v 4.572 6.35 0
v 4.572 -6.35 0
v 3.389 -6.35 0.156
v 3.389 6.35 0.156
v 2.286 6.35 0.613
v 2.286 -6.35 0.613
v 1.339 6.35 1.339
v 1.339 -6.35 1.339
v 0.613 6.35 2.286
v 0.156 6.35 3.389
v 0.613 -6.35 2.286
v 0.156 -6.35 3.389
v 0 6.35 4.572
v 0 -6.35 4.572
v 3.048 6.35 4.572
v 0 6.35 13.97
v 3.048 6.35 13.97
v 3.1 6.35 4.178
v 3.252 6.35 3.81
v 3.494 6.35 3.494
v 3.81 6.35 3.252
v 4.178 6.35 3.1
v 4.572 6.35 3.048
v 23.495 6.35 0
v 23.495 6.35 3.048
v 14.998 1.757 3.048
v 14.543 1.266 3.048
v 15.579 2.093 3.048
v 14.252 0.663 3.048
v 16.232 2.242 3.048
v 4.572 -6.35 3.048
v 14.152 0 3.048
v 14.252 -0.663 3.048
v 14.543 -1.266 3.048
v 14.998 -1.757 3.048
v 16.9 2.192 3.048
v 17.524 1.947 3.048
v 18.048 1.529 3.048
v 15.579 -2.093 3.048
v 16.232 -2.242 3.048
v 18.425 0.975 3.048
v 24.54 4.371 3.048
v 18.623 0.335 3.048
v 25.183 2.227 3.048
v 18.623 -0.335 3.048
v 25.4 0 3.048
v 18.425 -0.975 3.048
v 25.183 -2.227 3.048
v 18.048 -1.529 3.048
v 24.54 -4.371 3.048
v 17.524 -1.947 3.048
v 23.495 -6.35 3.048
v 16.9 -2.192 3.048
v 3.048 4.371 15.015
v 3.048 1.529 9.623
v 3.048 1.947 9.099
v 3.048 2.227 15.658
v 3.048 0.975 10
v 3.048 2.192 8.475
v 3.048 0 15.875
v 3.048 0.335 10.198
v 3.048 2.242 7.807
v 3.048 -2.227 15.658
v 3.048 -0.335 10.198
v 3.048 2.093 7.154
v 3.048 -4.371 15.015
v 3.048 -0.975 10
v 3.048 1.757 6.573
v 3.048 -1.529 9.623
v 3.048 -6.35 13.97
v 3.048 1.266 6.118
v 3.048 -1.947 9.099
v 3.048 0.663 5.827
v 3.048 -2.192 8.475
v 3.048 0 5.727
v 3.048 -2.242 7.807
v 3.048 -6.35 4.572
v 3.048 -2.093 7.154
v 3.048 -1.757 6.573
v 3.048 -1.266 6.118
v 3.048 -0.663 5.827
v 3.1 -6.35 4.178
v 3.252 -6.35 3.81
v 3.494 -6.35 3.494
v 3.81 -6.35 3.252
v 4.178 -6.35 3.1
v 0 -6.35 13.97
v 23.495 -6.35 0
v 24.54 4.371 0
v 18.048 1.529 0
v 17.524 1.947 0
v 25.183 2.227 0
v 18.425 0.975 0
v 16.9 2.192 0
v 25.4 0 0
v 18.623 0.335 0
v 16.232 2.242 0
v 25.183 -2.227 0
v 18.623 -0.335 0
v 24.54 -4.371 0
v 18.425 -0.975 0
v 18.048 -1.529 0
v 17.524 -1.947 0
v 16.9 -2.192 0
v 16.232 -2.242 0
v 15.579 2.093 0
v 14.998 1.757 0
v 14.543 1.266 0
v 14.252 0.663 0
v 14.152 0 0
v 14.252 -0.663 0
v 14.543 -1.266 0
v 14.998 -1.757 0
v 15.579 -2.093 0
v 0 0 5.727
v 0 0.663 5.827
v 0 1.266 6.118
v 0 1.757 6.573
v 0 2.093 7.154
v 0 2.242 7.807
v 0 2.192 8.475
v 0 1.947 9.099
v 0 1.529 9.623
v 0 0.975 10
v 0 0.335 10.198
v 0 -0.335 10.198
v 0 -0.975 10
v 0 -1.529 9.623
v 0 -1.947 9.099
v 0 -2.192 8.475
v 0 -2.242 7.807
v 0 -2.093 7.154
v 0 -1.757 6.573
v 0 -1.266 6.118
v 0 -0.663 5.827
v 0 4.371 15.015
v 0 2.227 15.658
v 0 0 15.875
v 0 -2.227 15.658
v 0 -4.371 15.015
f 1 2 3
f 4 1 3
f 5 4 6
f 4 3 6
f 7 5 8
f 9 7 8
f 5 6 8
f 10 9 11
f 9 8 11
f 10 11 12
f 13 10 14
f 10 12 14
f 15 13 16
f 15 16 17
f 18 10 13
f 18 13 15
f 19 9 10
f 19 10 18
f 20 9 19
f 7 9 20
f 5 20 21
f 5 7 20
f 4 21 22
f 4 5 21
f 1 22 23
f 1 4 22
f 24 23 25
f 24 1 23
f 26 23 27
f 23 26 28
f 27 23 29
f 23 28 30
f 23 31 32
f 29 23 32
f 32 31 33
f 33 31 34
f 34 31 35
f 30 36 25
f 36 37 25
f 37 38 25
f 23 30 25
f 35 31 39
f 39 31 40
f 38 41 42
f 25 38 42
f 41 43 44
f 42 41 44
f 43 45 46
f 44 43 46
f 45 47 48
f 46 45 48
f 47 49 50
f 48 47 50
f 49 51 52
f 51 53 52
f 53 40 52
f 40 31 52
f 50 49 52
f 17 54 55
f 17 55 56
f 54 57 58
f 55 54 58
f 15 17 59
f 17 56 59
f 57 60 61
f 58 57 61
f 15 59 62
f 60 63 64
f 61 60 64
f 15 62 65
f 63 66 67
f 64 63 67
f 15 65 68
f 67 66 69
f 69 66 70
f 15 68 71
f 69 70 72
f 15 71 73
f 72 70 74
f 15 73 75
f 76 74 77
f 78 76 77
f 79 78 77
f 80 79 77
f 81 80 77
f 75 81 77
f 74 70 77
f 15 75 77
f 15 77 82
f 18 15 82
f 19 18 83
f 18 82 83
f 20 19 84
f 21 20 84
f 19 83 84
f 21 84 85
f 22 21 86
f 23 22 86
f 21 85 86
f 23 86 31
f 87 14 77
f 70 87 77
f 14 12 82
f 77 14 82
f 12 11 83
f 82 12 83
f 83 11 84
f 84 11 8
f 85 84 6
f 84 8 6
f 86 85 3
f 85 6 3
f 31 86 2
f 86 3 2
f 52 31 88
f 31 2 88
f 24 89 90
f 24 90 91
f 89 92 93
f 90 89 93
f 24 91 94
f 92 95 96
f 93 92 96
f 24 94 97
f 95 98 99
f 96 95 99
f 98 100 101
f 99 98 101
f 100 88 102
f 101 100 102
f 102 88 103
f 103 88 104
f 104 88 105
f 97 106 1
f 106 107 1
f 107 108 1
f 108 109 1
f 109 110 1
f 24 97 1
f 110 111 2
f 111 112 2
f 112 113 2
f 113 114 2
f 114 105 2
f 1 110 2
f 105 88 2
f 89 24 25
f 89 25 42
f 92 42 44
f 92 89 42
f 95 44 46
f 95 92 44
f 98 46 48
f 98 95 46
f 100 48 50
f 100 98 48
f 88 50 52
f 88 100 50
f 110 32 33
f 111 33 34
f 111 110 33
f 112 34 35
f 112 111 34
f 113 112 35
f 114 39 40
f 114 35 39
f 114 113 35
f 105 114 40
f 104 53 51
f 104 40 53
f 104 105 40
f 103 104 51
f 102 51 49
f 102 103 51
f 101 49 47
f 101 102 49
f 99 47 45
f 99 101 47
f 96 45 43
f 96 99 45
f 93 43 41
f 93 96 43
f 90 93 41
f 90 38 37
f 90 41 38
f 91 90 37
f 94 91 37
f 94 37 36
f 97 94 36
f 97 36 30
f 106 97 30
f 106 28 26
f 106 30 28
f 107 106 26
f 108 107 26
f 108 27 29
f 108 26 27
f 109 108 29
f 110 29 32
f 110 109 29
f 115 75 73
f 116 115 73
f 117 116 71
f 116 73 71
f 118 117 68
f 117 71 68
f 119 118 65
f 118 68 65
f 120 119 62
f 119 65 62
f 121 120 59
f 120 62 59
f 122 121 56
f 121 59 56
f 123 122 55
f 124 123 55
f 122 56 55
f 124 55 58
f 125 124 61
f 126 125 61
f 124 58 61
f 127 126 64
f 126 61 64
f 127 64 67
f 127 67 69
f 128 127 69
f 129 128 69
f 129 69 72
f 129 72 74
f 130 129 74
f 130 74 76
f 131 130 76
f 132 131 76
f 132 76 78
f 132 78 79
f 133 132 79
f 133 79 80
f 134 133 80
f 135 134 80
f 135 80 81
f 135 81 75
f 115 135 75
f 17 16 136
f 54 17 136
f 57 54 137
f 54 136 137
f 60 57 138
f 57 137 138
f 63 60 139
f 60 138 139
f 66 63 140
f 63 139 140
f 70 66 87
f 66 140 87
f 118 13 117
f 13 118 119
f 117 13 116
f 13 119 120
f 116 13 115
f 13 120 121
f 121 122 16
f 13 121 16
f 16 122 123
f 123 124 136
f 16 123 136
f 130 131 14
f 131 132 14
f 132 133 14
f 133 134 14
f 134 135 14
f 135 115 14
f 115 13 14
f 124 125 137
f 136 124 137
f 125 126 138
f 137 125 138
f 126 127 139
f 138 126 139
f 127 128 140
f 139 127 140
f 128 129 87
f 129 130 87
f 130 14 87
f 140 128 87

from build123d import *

# Parameters (mm, degrees)
EXTRUDE_THIN1_START     = -6.35
EXTRUDE_THIN1_DEPTH     = 12.7
SKETCH4_R               = 2.2479
EXTRUDE3_DEPTH          = 29.141606724
SKETCH6_R               = 2.2479
CUT_EXTRUDE1_DEPTH      = 31.618591166
CUT_EXTRUDE2_DEPTH      = 29.141606724
CUT_EXTRUDE2_DEPTH_BACK = 29.141606724
CUT_EXTRUDE3_DEPTH      = 31.618591166
CUT_EXTRUDE3_DEPTH_BACK = 31.618591166


# Read off the part's stored shape, not the designer's step: Extrude-Thin1
with BuildPart() as part:
    # Extrude-Thin1 outline → Extrude-Thin1 (new body)
    with BuildSketch(Plane(origin=(0, 0, 0), x_dir=(1, 0, 0), z_dir=(0, 1, 0)).offset(EXTRUDE_THIN1_START)):
        with BuildLine():
            Line((4.572, -3.048), (25.4, -3.048))
            Line((25.4, -3.048), (25.4, 0))
            Line((25.4, 0), (4.572, 0))
            ThreePointArc((4.572, 0), (1.339107796, -1.339107796), (0, -4.572))
            Line((0, -4.572), (0, -15.875))
            Line((0, -15.875), (3.048, -15.875))
            Line((3.048, -15.875), (3.048, -4.572))
            ThreePointArc((3.048, -4.572), (3.494369265, -3.494369265), (4.572, -3.048))
        make_face()
    extrude(amount=EXTRUDE_THIN1_DEPTH)

    # Sketch4 → Extrude3 (cut, through all)
    with BuildSketch(Plane(origin=(3.048, 0, 0), x_dir=(0, 0, -1), z_dir=(1, 0, 0))):
        with Locations((-7.975, 0)):
            Circle(SKETCH4_R)
    extrude(amount=-EXTRUDE3_DEPTH, mode=Mode.SUBTRACT)

    # Sketch6 → Cut-Extrude1 (cut, through all)
    with BuildSketch(Plane.XY):
        with Locations(Location((16.4, 0, 0), (0, 0, 180))):
            Circle(SKETCH6_R)
    extrude(amount=CUT_EXTRUDE1_DEPTH, mode=Mode.SUBTRACT)

    # Sketch8 → Cut-Extrude2 (cut, two sides: drawn at the far end of the back side and taken through both)
    with BuildSketch(Plane(origin=(3.048, 0, 0), x_dir=(0, 0, -1), z_dir=(1, 0, 0)).offset(-CUT_EXTRUDE2_DEPTH_BACK)):
        with BuildLine():
            Line((12.319806212, 46.222872755), (-13.97, 6.35))
            ThreePointArc((-13.97, 6.35), (-15.875, 0), (-13.97, -6.35))
            Line((-13.97, -6.35), (12.319806212, -46.222872755))
            Line((12.319806212, -46.222872755), (-83.199823025, -46.222872755))
            Line((-83.199823025, -46.222872755), (-83.199823025, 46.222872755))
            Line((-83.199823025, 46.222872755), (12.319806212, 46.222872755))
        make_face()
    extrude(amount=CUT_EXTRUDE2_DEPTH + CUT_EXTRUDE2_DEPTH_BACK, mode=Mode.SUBTRACT)

    # Sketch9 → Cut-Extrude3 (cut, two sides: drawn at the far end of the back side and taken through both)
    with BuildSketch(Plane.XY.offset(-CUT_EXTRUDE3_DEPTH_BACK)):
        with BuildLine():
            Line((-11.412637658, 59.293250448), (23.495, 6.35))
            ThreePointArc((23.495, 6.35), (25.4, 0), (23.495, -6.35))
            Line((23.495, -6.35), (-11.412637658, -59.293250448))
            Line((-11.412637658, -59.293250448), (115.418445833, -59.293250448))
            Line((115.418445833, -59.293250448), (115.418445833, 59.293250448))
            Line((115.418445833, 59.293250448), (-11.412637658, 59.293250448))
        make_face()
    extrude(amount=CUT_EXTRUDE3_DEPTH + CUT_EXTRUDE3_DEPTH_BACK, mode=Mode.SUBTRACT)


solid = part.part
